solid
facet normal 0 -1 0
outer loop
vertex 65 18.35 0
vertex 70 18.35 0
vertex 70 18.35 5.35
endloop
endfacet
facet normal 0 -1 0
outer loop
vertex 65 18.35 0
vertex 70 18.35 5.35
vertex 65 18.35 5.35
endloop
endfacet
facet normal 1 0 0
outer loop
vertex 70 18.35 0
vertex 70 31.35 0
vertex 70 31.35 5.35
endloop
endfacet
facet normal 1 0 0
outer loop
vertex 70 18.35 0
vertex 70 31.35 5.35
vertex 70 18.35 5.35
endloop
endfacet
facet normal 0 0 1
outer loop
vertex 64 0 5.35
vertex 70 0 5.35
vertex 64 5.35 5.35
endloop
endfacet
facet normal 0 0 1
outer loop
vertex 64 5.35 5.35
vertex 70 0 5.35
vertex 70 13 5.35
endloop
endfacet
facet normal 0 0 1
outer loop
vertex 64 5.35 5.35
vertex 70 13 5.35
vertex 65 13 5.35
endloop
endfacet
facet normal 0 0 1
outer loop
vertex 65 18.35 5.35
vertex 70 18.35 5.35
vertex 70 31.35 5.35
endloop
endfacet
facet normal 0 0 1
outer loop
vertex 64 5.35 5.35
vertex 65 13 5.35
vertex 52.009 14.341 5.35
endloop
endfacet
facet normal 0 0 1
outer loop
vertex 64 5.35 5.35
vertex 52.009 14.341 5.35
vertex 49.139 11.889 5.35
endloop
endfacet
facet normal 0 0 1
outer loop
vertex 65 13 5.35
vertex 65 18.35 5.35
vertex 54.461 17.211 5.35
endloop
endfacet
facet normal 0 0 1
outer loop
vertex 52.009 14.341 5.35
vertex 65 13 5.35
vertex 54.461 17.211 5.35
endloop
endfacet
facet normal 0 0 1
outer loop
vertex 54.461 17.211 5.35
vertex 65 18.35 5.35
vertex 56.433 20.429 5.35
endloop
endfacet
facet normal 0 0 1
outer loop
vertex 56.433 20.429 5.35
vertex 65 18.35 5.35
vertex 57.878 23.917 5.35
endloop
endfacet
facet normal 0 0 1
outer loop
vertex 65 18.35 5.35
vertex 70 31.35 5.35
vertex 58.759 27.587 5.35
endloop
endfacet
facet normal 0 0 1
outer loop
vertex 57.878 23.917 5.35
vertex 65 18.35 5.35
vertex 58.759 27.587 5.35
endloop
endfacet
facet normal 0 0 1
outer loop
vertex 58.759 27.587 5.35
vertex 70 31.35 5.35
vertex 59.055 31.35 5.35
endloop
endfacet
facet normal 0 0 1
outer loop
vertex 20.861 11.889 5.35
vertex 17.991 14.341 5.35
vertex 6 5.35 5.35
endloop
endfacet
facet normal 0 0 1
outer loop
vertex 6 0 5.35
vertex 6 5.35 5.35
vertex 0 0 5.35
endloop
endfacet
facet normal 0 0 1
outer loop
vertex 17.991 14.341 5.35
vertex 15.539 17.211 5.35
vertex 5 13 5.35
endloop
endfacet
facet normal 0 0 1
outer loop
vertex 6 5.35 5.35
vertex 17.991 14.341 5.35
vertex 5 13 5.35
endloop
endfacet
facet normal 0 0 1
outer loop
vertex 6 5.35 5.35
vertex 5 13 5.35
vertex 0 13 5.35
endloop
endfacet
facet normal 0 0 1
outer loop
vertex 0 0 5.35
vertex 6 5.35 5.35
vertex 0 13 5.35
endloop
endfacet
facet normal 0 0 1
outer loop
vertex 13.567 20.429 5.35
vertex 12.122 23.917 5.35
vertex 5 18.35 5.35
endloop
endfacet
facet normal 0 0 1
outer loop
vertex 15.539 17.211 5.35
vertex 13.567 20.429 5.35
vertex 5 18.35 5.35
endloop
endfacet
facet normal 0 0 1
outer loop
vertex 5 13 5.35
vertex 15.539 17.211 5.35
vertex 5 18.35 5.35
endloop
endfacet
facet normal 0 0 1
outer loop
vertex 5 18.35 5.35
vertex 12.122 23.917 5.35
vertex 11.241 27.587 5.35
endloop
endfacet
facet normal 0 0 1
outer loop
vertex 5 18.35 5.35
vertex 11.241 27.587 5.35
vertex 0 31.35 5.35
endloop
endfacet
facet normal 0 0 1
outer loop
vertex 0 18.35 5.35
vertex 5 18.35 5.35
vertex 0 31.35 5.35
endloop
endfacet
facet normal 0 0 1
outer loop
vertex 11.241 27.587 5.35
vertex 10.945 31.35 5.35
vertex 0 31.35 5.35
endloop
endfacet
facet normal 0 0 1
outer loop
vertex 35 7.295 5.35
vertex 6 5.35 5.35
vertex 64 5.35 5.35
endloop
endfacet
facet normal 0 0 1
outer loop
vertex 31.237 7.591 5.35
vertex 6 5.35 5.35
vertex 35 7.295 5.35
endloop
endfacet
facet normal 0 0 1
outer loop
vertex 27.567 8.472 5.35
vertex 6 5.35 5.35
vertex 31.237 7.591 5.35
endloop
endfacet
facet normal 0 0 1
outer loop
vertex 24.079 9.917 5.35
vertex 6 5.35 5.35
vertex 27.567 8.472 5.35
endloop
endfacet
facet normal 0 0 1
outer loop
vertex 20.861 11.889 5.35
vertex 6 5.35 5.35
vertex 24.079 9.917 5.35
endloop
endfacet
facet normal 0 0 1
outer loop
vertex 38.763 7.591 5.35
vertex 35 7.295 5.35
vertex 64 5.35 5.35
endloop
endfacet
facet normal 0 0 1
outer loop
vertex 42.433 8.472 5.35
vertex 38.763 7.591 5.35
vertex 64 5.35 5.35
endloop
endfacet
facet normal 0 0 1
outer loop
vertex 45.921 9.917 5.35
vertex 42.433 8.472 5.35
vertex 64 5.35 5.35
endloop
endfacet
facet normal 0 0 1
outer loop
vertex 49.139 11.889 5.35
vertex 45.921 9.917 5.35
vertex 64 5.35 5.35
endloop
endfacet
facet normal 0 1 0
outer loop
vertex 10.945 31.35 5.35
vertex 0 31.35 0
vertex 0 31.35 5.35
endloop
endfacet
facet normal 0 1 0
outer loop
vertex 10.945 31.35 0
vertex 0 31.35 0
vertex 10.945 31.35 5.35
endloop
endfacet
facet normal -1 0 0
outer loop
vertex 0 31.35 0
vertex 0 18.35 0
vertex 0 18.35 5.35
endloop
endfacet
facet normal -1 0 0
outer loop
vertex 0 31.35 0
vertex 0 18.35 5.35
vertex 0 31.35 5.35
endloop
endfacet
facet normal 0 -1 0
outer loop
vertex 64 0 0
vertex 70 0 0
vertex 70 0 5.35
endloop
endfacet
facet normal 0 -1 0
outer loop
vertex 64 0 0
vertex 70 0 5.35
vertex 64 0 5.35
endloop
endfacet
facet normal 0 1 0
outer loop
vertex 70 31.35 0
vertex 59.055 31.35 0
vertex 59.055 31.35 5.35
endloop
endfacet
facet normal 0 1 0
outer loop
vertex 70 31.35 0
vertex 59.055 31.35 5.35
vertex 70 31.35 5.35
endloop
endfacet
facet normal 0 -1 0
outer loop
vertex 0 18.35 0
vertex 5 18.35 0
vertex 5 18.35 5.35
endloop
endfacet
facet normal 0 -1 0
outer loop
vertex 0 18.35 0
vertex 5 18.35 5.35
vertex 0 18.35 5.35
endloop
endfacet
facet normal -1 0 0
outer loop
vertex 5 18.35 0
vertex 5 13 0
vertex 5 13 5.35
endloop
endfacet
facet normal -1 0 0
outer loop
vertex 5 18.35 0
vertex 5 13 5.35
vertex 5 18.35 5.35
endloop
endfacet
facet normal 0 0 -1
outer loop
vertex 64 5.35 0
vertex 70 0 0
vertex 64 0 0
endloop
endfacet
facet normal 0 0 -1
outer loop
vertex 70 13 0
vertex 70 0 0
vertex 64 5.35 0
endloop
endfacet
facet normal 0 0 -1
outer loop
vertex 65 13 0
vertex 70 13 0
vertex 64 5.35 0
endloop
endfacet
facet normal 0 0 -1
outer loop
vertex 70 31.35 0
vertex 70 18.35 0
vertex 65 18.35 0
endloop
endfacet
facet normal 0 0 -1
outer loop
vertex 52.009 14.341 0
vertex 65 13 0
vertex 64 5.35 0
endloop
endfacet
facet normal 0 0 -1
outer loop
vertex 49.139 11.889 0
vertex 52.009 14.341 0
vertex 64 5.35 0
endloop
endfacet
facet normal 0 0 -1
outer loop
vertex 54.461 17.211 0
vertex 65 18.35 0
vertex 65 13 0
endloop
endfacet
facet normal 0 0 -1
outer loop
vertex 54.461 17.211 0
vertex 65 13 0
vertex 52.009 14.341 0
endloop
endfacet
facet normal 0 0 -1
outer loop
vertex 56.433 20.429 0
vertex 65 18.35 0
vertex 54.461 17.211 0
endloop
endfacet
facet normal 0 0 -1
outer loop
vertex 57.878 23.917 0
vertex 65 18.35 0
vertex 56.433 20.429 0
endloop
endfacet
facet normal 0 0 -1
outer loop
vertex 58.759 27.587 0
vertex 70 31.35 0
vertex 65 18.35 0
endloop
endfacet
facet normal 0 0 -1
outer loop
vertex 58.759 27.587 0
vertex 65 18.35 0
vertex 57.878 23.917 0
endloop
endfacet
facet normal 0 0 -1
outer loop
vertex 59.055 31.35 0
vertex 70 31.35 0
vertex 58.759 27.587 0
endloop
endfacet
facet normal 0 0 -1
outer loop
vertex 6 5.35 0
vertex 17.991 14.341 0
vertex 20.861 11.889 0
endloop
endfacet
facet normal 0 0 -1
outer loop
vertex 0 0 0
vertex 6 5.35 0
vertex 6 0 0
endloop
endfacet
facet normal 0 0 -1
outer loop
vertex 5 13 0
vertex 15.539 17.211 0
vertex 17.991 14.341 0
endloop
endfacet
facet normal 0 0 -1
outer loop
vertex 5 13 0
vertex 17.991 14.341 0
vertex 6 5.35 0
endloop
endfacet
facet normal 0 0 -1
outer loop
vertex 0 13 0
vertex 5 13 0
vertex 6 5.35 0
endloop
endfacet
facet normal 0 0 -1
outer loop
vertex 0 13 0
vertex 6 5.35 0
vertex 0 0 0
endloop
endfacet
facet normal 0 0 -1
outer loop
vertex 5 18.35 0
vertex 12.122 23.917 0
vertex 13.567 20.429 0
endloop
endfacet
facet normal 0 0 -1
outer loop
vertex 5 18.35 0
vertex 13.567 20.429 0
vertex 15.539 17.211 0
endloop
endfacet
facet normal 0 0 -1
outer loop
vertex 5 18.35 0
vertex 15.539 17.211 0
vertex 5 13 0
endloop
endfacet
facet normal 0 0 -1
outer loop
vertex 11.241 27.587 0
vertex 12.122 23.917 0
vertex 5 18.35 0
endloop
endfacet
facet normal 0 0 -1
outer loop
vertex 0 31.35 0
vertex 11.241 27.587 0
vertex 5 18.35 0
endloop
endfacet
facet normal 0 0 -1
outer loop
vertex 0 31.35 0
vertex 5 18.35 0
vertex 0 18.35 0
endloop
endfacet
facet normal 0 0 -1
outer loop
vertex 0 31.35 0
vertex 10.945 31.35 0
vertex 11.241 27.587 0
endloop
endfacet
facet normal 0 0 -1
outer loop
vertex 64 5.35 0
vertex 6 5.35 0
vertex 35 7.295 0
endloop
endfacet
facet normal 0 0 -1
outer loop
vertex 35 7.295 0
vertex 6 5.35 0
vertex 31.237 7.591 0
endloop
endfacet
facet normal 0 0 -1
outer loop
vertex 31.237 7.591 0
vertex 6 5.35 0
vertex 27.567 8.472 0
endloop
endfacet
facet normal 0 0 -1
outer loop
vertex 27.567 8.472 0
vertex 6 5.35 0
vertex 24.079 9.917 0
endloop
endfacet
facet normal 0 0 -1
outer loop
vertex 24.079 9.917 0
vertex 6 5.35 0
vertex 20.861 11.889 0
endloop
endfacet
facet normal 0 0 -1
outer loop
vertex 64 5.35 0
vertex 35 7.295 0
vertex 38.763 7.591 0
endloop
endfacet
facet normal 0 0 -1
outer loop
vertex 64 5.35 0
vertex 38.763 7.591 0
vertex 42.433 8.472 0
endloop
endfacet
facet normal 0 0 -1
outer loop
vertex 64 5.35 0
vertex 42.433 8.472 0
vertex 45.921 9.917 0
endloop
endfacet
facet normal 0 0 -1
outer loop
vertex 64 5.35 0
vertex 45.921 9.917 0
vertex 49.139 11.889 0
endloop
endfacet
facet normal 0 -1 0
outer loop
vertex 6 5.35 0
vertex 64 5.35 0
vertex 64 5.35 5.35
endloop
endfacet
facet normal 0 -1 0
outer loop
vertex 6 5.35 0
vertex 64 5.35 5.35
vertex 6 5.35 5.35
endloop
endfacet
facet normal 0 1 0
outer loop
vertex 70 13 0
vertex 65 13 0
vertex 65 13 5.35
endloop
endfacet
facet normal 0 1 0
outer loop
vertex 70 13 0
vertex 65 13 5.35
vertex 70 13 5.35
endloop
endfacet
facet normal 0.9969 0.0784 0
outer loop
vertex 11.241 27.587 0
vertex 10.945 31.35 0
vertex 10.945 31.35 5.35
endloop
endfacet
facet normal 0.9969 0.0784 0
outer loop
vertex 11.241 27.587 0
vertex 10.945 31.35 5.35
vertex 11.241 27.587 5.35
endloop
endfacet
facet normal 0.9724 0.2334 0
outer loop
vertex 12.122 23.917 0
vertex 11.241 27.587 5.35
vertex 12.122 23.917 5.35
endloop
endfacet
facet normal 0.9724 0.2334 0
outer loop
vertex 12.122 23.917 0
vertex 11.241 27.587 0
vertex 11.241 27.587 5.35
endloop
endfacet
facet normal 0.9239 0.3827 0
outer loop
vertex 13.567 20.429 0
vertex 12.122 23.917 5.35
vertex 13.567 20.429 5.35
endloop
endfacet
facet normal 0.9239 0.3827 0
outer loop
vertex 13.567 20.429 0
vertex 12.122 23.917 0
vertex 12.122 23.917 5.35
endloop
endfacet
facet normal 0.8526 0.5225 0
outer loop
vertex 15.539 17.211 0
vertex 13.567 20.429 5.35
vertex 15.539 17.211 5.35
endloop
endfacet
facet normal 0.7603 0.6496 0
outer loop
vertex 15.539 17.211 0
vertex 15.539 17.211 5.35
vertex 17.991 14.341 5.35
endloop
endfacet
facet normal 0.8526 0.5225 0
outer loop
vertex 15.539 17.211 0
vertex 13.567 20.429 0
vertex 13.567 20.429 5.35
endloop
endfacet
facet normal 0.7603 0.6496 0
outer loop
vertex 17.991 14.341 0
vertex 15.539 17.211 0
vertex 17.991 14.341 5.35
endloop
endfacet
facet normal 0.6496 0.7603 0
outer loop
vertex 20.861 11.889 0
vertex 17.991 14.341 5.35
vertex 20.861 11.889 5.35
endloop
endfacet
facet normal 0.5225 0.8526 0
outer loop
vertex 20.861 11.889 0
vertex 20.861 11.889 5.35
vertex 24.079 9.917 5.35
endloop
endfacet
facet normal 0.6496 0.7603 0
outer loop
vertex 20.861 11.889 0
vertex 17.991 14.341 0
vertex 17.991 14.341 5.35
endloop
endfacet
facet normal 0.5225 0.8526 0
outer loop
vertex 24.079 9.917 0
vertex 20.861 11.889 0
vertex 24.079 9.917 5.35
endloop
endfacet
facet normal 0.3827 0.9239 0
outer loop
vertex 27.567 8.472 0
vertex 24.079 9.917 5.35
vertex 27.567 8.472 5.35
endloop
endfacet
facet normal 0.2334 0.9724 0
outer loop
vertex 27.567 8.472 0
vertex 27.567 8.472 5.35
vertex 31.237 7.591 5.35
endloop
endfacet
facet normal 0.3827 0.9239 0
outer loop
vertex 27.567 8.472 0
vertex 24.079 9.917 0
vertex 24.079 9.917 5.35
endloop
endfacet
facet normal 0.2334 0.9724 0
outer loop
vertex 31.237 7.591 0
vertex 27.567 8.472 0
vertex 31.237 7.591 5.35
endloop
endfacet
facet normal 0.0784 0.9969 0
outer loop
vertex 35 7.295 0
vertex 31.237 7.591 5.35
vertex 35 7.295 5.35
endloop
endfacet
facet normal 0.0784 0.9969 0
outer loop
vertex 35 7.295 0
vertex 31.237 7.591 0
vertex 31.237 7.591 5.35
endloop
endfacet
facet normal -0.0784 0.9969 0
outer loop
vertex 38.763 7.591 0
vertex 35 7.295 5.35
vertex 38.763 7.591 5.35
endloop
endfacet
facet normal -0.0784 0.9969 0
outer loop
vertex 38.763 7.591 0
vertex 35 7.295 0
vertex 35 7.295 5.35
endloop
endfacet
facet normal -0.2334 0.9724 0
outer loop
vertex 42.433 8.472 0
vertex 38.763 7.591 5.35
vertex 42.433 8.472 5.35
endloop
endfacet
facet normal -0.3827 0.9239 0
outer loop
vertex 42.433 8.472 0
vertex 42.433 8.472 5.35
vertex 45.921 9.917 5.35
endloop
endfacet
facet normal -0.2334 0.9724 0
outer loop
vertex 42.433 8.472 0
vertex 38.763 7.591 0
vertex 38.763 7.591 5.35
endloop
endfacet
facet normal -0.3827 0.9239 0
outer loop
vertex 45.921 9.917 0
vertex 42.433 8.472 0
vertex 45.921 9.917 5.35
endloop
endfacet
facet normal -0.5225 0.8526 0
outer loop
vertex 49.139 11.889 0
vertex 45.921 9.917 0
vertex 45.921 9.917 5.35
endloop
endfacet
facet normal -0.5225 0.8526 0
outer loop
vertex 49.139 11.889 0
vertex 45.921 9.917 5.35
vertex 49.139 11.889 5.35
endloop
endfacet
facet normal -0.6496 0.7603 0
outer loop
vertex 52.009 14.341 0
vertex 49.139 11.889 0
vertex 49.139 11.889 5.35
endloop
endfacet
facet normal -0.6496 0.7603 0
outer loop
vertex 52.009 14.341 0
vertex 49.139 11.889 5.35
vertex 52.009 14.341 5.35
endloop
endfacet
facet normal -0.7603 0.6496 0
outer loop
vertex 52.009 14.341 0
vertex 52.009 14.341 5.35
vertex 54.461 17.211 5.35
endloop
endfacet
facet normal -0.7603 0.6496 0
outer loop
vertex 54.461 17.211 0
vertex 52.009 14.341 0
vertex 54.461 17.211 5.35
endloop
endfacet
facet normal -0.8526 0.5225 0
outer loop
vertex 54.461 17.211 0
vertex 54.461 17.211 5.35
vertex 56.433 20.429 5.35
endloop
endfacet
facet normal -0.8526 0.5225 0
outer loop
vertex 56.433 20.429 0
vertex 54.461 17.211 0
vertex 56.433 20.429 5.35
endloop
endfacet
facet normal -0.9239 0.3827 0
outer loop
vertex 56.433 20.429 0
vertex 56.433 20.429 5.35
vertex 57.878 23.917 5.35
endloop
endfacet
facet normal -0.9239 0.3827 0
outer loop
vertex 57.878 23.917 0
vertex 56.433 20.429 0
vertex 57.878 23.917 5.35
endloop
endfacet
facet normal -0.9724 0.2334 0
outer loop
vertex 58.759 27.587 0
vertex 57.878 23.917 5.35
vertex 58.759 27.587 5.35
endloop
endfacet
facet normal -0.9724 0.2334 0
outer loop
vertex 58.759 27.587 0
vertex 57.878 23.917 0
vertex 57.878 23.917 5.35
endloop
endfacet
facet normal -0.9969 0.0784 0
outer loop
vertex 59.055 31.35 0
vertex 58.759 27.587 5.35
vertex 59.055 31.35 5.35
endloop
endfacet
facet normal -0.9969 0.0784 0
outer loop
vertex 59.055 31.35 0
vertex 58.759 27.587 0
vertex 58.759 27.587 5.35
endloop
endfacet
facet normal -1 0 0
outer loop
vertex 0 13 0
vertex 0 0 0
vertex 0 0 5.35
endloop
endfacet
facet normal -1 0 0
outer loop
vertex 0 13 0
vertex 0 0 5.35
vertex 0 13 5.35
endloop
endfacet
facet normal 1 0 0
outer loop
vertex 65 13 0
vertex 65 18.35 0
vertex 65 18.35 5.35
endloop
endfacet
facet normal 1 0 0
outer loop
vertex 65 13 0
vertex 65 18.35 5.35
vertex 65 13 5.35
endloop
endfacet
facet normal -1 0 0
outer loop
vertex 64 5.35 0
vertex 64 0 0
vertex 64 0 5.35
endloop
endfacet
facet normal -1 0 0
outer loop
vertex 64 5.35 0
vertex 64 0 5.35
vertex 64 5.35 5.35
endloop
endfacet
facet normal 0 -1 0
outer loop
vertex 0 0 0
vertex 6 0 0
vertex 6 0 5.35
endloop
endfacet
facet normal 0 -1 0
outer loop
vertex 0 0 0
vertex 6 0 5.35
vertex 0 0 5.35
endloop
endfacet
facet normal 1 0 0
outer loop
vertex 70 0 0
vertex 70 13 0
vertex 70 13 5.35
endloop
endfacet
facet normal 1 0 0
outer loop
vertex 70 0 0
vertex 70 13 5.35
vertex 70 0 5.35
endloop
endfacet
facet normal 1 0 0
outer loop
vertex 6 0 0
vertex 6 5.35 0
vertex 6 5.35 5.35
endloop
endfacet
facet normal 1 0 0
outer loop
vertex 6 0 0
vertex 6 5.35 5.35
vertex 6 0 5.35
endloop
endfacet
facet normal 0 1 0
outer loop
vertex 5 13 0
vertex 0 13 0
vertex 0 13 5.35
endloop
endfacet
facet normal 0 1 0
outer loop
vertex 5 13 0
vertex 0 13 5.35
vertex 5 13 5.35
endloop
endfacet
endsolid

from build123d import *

# Parameters (mm, degrees)
BOSS_EXTRUDE1_DEPTH = 5.35


with BuildPart() as part:
    # Model → Boss-Extrude1 (new body)
    with BuildSketch(Plane.XY):
        with BuildLine():
            Line((59.055, 31.35), (70, 31.35))
            Line((70, 31.35), (70, 18.35))
            Line((70, 18.35), (65, 18.35))
            Line((65, 18.35), (65, 13))
            Line((65, 13), (70, 13))
            Line((70, 13), (70, 0))
            Line((70, 0), (64, 0))
            Line((64, 0), (64, 5.35))
            Line((64, 5.35), (6, 5.35))
            Line((6, 5.35), (6, 0))
            Line((6, 0), (0, 0))
            Line((0, 0), (0, 13))
            Line((0, 13), (5, 13))
            Line((5, 13), (5, 18.35))
            Line((5, 18.35), (0, 18.35))
            Line((0, 18.35), (0, 31.35))
            Line((0, 31.35), (10.945, 31.35))
            ThreePointArc((10.945, 31.35), (35, 7.295), (59.055, 31.35))
        make_face()
    extrude(amount=BOSS_EXTRUDE1_DEPTH)


solid = part.part
